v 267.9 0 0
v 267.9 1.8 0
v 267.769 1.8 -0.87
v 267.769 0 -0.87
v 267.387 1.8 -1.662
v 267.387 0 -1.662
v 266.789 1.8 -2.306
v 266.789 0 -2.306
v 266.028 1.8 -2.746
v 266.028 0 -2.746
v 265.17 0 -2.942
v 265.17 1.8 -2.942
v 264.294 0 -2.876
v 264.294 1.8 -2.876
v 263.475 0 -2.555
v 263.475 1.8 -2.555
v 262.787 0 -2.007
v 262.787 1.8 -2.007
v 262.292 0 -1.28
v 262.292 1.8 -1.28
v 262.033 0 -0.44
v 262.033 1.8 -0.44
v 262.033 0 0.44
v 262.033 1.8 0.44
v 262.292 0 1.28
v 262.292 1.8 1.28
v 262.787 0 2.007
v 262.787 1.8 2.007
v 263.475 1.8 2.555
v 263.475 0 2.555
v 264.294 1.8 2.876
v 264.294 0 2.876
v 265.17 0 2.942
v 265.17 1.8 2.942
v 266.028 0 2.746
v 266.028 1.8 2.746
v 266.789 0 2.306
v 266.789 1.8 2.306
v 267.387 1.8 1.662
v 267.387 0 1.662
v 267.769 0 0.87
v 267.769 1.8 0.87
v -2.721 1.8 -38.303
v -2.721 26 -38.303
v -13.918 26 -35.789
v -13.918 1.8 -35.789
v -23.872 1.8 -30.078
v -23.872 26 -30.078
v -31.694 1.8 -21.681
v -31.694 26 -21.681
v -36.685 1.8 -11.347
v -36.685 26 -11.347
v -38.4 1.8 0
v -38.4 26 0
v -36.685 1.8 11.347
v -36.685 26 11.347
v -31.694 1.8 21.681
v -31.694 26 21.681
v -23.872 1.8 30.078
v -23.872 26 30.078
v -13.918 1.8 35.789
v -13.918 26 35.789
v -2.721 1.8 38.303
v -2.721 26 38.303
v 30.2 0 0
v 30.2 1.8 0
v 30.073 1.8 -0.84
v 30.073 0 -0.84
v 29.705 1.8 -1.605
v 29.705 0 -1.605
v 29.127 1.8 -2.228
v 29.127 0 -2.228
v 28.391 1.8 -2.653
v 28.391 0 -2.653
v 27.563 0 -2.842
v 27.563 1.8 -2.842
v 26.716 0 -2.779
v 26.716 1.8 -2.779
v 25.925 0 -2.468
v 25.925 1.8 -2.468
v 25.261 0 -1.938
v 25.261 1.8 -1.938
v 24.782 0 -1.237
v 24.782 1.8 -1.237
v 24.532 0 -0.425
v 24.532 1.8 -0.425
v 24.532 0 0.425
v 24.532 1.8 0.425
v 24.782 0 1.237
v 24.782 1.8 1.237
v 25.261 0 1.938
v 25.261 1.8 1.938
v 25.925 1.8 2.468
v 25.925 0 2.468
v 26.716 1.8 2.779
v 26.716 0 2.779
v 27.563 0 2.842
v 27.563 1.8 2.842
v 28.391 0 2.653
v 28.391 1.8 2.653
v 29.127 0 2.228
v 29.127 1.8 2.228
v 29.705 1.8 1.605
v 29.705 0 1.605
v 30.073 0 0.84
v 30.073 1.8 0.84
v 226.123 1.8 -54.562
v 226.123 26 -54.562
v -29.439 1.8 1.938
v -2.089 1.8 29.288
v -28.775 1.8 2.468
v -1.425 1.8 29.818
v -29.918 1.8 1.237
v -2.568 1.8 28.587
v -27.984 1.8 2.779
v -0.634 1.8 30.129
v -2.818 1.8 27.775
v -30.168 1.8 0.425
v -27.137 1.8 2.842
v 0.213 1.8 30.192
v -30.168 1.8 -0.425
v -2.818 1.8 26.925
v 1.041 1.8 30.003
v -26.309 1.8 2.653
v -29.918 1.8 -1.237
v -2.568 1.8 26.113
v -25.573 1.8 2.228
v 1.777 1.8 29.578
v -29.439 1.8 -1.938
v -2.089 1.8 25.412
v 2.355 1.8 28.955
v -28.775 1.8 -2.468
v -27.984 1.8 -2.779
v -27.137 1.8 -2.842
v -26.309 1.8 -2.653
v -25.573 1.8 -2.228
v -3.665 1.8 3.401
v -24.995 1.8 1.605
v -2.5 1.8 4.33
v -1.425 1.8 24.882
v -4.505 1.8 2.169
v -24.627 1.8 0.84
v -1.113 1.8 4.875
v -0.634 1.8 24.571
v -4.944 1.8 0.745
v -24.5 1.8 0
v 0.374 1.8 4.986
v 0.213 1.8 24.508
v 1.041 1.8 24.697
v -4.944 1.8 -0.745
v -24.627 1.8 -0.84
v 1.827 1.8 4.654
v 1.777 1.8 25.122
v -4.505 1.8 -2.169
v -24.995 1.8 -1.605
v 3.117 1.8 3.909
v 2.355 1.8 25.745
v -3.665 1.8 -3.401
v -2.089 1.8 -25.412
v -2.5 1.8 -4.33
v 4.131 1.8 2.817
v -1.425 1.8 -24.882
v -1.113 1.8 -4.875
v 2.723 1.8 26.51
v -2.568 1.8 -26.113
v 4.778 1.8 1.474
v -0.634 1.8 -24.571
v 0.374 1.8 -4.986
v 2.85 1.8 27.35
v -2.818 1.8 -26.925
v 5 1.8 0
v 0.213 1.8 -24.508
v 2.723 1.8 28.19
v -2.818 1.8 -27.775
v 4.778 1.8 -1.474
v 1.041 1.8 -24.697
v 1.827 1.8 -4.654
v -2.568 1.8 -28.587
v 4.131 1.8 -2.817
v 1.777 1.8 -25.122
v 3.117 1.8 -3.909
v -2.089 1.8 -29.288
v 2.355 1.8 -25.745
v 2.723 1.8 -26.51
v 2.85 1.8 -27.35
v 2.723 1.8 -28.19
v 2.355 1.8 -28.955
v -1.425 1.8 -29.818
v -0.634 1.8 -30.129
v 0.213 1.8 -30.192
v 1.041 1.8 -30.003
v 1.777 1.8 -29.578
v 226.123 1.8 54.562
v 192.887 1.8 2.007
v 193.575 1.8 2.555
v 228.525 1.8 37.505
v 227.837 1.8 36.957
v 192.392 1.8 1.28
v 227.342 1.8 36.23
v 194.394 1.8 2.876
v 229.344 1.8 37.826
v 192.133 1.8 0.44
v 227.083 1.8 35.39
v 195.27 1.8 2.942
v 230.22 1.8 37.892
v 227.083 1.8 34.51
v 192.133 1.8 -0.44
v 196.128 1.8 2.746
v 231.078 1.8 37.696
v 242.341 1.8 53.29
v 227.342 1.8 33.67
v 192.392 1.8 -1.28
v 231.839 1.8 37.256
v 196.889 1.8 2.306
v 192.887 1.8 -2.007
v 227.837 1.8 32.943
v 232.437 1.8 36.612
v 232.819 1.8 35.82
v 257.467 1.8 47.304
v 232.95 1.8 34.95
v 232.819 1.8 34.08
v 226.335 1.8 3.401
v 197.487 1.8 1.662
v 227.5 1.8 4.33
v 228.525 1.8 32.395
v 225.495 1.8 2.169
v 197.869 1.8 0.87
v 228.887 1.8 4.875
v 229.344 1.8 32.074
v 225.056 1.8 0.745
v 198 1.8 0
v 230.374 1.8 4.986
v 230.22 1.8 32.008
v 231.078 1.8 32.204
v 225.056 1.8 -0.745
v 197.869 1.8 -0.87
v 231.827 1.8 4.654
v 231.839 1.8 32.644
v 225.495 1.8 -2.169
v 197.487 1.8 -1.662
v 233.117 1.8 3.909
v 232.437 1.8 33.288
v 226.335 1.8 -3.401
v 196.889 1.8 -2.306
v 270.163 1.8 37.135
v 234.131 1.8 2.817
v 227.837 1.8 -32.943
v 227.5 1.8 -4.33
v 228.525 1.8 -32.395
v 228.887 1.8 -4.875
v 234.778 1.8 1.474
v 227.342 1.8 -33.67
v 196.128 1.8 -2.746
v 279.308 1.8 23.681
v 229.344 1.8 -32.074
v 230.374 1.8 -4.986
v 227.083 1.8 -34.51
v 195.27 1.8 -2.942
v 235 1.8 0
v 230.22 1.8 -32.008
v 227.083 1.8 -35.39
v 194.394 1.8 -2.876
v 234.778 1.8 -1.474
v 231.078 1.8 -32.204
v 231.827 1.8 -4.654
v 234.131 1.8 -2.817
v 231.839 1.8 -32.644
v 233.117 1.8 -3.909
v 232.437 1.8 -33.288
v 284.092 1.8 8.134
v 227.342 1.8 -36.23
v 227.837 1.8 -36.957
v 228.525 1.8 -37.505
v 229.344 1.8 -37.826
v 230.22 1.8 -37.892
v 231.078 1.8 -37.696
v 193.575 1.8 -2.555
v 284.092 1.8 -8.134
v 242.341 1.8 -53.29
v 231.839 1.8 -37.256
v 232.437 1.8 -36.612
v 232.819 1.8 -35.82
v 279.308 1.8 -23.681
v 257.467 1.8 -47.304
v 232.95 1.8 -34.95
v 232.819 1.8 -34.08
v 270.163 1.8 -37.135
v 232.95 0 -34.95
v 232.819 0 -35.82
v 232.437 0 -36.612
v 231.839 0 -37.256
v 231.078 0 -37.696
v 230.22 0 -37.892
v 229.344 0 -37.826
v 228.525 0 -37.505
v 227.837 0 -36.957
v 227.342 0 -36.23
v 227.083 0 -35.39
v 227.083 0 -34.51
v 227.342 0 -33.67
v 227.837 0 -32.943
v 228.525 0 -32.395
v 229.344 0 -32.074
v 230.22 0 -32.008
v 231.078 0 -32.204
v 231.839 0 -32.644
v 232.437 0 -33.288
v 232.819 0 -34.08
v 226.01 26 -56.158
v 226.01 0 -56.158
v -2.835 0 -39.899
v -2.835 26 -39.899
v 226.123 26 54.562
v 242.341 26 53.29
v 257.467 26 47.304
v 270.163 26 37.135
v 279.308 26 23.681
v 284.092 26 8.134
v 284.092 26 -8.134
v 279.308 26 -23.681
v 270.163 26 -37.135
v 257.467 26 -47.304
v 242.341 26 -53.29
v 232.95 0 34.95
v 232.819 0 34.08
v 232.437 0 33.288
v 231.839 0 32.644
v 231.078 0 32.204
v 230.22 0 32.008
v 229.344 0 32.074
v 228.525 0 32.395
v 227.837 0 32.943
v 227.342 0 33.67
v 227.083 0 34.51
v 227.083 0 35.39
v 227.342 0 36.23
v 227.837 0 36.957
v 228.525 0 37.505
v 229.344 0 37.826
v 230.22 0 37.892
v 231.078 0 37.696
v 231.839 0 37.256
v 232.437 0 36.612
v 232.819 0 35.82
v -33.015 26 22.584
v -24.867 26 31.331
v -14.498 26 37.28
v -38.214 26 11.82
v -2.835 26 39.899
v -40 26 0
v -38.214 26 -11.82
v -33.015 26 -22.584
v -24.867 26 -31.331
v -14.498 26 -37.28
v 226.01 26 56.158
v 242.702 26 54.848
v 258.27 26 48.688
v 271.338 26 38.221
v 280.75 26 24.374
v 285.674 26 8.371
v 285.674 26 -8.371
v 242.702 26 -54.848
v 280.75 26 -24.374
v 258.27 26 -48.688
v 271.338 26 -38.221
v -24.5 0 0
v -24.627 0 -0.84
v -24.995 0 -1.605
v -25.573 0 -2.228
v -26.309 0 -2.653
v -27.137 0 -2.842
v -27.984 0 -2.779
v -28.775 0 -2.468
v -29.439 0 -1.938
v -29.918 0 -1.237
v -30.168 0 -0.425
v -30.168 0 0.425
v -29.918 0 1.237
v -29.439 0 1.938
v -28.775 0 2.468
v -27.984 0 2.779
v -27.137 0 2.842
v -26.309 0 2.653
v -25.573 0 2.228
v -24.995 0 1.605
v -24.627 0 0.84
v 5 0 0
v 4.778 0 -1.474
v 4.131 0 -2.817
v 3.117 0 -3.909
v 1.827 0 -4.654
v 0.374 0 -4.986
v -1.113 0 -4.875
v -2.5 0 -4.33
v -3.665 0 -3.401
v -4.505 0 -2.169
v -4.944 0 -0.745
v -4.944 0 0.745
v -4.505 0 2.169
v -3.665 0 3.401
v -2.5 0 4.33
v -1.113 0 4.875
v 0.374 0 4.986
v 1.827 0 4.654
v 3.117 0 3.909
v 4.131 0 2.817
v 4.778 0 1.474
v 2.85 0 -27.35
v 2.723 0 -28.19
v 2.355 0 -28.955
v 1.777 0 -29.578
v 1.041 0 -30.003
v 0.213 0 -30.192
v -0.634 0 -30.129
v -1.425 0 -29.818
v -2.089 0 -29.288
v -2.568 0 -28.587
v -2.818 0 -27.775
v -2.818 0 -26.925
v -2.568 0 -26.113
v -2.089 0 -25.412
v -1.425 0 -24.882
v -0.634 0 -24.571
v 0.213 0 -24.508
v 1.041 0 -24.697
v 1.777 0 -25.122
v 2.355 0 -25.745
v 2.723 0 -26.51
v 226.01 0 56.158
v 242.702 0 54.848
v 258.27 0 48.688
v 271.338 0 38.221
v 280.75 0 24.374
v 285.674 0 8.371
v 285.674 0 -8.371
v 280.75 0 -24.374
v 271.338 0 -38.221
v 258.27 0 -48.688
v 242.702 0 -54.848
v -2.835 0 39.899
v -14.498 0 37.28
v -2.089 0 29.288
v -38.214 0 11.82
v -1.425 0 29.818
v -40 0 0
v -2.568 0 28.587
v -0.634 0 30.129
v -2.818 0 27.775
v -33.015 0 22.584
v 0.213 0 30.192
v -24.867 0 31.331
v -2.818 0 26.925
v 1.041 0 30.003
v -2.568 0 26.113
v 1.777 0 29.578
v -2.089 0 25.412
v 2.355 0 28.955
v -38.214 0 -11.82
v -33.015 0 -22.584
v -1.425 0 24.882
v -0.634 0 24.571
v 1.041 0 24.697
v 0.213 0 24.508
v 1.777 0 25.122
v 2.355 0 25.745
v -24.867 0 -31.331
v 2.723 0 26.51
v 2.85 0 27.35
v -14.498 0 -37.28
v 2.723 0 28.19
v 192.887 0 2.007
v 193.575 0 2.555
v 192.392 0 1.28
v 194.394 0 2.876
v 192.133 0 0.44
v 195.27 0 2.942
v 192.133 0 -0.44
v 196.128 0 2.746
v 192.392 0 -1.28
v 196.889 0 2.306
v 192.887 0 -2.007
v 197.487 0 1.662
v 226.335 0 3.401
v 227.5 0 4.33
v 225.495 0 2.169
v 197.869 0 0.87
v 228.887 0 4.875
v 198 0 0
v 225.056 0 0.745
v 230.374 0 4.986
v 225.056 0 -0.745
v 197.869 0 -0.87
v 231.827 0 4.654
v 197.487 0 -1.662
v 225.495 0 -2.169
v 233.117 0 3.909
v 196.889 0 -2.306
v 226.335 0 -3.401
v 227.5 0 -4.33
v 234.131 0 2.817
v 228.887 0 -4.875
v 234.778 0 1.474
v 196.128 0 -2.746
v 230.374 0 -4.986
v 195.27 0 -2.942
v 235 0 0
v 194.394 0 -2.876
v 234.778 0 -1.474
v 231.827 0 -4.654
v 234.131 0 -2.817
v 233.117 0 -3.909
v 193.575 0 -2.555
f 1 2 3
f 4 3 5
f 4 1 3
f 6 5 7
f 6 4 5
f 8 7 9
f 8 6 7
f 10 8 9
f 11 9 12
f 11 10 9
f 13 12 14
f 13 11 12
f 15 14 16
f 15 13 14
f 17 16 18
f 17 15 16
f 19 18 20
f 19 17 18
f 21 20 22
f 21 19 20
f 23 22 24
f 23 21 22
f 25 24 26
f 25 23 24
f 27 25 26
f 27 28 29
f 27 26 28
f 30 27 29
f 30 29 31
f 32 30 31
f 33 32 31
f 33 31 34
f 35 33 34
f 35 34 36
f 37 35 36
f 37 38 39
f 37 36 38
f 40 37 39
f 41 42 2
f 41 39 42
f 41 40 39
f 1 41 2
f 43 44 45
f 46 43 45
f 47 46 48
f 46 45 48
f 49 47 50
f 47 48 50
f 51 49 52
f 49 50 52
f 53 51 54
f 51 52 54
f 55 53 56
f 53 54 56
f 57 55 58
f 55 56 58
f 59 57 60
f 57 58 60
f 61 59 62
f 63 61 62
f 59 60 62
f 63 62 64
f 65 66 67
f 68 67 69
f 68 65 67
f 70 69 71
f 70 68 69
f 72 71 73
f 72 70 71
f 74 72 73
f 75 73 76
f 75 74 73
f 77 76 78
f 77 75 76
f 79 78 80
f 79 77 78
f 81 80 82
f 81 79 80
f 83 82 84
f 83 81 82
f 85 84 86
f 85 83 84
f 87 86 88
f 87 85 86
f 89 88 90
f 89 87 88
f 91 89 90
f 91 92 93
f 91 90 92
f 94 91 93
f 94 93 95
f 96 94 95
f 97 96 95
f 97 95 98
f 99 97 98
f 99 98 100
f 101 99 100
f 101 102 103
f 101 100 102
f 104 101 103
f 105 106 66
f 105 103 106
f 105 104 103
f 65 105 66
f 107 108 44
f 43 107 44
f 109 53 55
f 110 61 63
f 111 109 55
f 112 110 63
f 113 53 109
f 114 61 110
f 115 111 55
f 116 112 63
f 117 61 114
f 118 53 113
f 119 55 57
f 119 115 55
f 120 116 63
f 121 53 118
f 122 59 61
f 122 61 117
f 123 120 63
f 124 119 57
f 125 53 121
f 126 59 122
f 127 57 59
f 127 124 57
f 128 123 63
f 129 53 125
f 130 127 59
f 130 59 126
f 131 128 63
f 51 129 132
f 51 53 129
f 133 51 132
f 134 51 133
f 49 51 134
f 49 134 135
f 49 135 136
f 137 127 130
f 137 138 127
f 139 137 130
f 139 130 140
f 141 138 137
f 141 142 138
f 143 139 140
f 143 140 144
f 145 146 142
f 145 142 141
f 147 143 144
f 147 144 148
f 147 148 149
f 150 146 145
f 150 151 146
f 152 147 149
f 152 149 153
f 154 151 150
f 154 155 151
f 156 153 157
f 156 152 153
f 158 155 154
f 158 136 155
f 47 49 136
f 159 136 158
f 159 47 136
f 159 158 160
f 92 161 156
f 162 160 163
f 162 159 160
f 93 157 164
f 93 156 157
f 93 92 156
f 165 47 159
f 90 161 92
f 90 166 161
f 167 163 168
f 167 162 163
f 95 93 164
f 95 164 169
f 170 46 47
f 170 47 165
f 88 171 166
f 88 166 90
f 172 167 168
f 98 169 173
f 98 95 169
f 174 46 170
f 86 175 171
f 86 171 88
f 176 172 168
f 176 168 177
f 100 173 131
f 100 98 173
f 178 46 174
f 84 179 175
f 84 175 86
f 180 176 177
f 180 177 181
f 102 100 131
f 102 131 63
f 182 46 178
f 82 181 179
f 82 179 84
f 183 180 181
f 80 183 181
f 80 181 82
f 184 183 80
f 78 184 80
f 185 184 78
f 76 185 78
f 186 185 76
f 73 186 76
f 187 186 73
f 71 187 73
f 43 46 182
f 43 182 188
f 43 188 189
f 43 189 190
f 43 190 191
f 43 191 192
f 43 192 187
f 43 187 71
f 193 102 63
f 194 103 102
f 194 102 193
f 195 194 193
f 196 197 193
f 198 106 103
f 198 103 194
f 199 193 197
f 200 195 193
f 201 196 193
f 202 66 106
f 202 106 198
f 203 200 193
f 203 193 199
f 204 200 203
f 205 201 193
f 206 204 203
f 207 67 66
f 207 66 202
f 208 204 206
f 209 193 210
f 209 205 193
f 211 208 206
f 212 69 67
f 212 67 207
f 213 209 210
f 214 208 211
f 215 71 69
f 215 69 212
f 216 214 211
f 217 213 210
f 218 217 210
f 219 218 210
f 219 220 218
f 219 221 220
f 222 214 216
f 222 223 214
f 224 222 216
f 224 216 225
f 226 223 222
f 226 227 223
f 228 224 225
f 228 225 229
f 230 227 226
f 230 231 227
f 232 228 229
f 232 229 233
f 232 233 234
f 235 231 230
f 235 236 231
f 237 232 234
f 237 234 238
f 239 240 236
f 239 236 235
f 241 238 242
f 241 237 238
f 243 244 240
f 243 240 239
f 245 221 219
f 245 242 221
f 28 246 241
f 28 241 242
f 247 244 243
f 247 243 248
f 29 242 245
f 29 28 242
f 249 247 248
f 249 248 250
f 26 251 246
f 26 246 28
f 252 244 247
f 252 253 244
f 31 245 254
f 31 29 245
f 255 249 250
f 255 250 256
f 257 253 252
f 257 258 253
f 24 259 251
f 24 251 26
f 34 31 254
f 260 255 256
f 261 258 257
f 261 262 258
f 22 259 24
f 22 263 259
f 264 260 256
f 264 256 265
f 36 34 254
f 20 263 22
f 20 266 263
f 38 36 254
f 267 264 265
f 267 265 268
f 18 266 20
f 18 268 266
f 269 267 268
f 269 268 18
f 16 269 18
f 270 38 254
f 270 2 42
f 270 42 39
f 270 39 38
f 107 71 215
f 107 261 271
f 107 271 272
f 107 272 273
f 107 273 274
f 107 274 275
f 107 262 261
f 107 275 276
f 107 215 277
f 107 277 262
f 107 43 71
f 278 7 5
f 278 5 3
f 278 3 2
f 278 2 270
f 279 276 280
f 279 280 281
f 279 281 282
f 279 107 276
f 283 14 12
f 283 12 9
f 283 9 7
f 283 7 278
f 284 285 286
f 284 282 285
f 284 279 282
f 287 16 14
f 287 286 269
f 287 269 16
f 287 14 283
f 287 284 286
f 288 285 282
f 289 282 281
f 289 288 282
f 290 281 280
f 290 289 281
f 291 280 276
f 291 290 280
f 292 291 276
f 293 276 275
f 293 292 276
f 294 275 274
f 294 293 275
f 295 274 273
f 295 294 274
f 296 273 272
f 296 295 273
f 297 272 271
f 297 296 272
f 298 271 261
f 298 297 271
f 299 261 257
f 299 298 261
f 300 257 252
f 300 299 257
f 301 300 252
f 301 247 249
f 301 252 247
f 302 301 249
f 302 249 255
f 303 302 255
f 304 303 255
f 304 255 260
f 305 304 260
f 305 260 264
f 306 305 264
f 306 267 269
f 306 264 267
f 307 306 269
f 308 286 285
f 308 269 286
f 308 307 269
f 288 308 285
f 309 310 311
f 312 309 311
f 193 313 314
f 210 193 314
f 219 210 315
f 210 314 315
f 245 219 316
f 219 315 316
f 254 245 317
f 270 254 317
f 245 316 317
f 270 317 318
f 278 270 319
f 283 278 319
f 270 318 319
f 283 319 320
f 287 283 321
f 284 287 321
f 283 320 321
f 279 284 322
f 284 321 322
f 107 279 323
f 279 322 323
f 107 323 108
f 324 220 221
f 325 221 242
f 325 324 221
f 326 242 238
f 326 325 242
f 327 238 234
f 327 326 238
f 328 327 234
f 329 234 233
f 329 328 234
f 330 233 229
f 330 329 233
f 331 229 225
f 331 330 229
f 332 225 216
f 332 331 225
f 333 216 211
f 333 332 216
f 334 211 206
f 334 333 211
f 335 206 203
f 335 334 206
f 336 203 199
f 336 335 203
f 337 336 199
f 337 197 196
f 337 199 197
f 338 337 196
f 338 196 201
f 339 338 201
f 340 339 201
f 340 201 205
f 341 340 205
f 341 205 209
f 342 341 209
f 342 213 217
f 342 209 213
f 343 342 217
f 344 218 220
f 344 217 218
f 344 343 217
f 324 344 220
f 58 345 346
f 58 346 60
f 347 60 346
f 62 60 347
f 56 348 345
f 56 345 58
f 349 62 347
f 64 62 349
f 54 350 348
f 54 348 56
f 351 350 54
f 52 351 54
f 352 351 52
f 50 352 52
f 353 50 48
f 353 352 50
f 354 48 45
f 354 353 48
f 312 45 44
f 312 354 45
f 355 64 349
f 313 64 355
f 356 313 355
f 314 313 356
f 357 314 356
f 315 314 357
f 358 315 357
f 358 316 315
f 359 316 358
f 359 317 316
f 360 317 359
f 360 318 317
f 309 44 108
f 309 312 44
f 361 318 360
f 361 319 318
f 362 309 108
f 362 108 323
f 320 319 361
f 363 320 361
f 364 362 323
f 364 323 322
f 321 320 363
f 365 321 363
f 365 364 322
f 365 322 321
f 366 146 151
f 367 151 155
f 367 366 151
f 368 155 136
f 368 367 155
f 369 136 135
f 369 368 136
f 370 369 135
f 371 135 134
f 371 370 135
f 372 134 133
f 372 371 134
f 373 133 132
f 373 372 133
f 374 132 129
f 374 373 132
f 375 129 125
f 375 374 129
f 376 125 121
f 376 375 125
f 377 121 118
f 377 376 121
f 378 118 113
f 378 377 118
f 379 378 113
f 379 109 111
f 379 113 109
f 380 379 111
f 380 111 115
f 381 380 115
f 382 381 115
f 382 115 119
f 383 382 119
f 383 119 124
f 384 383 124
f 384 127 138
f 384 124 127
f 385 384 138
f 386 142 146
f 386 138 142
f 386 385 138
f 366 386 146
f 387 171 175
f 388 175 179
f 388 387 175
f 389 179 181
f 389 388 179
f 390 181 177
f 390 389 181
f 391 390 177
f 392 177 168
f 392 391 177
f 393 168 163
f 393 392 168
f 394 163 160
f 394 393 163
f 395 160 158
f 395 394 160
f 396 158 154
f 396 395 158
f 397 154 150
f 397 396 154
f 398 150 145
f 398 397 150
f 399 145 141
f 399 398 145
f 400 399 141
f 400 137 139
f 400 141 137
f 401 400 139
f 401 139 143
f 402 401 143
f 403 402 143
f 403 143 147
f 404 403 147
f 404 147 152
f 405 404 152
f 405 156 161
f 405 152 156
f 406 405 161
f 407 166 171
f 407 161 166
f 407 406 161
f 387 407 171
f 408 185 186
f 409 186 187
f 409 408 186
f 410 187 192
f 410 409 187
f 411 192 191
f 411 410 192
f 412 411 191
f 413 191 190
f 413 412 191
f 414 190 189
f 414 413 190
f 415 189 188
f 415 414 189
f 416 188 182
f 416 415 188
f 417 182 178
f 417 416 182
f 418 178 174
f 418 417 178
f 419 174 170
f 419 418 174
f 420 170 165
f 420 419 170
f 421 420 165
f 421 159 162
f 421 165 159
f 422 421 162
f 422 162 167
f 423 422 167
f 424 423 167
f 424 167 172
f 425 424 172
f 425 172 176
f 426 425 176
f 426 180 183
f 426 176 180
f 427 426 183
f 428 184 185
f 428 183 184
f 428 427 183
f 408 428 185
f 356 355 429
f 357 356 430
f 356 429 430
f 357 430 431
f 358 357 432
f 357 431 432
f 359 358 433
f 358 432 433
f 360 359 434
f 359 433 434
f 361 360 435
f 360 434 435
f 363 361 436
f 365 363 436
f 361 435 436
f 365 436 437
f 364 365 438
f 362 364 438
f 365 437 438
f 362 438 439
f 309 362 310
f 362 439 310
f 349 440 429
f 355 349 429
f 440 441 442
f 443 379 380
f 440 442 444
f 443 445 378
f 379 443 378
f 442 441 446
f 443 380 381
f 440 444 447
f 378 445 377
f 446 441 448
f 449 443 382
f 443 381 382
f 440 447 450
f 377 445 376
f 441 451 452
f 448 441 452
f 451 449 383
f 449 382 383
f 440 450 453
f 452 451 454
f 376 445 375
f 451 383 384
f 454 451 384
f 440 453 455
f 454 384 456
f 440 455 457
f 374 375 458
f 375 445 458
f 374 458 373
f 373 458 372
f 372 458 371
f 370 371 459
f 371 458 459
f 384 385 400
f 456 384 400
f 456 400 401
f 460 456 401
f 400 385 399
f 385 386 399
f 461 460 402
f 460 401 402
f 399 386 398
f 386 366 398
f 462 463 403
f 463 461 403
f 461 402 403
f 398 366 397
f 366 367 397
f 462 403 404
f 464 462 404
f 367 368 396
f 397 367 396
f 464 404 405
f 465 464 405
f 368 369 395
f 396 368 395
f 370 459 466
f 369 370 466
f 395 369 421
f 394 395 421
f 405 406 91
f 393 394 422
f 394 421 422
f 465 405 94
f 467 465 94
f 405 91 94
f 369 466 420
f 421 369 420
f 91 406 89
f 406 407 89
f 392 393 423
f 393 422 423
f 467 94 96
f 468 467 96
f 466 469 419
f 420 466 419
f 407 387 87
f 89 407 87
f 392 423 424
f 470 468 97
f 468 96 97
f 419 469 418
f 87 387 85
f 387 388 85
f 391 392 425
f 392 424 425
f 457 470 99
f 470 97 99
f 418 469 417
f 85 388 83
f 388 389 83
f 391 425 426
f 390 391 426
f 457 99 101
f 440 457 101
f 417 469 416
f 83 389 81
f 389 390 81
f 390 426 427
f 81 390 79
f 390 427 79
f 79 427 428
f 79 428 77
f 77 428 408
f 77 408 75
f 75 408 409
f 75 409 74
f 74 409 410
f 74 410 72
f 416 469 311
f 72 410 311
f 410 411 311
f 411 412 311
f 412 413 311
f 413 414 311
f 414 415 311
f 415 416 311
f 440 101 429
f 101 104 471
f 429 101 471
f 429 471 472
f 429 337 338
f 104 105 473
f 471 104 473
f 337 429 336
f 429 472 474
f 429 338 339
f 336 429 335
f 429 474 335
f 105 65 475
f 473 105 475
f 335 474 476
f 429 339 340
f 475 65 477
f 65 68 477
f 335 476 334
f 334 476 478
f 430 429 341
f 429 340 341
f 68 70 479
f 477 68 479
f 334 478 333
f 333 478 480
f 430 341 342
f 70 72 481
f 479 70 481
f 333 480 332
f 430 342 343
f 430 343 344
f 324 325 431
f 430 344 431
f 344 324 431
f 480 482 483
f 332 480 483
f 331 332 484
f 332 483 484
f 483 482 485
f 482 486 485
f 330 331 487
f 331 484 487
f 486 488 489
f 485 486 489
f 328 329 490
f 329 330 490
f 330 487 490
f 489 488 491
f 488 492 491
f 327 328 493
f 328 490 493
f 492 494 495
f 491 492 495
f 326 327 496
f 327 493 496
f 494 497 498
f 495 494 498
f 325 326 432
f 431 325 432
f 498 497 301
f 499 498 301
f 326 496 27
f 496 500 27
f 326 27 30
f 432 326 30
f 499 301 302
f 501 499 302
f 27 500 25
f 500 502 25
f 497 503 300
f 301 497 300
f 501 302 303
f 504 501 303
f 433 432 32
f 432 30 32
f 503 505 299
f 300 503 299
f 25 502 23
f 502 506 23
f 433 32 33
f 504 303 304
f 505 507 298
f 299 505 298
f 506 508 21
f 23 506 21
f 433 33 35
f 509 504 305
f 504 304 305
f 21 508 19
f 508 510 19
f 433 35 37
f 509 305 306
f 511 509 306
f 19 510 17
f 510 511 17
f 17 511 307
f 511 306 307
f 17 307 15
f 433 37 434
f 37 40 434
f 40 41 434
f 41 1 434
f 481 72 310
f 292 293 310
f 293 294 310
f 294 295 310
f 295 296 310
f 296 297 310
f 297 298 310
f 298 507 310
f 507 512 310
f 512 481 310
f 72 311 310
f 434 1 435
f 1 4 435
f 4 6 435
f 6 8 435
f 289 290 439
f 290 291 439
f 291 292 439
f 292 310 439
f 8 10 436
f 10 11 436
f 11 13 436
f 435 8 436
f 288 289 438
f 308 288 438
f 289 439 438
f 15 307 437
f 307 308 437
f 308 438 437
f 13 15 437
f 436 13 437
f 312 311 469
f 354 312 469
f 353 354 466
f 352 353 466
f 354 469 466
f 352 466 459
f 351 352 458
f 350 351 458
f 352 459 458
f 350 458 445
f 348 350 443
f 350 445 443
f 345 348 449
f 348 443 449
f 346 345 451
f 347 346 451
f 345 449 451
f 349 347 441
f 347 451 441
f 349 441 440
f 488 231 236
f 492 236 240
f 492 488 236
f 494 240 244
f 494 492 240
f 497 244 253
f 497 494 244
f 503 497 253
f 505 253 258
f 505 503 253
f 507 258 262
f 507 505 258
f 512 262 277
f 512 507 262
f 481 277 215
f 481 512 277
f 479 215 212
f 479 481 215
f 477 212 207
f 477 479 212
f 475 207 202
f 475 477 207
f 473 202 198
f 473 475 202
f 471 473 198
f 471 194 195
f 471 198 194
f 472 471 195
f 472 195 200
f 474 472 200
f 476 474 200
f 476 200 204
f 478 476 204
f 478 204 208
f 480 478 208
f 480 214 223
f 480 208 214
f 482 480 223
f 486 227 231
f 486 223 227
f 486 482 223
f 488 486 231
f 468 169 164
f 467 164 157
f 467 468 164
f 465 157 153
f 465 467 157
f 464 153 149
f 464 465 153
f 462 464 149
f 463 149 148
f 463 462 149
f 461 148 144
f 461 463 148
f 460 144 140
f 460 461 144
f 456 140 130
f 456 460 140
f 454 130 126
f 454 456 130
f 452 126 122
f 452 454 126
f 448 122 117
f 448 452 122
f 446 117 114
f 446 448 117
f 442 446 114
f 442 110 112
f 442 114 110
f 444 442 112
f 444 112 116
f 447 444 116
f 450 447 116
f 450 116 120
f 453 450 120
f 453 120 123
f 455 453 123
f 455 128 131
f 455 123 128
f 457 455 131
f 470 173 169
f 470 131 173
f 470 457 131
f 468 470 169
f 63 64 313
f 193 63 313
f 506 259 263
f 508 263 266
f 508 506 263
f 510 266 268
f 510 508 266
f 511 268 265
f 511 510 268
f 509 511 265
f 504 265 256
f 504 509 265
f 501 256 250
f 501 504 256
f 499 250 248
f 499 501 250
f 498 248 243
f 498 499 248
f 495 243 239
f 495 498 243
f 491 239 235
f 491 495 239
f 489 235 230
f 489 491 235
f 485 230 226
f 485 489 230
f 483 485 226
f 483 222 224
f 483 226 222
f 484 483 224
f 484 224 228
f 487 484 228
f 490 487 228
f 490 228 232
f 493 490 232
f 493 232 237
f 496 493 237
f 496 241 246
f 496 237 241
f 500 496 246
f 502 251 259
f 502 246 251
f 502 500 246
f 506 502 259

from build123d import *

# Parameters (mm, degrees)
SKETCH1_R           = 40
SKETCH1_R_2         = 2.85
SKETCH1_R_3         = 5
SKETCH1_R_4         = 56.3
SKETCH1_R_5         = 2.95
BOSS_EXTRUDE1_DEPTH = 26
CUT_EXTRUDE1_DEPTH  = 24.2


with BuildPart() as part:
    # Sketch1 → Boss-Extrude1 (new body)
    with BuildSketch(Plane(origin=(0, 0, 0), x_dir=(1, 0, 0), z_dir=(0, 1, 0))):
        with BuildLine():
            Line((226.010043478, 56.158438787), (-2.834782609, 39.899423649))
            ThreePointArc((-2.834782609, 39.899423649), (27.263608489, 29.269363713), (40, 0))
            ThreePointArc((40, 0), (27.263608489, -29.269363713), (-2.834782609, -39.899423649))
            Line((-2.834782609, -39.899423649), (226.010043478, -56.158438787))
            ThreePointArc((226.010043478, -56.158438787), (173.7, 0), (226.010043478, 56.158438787))
        make_face()
        Circle(SKETCH1_R)
        with Locations((-27.35, 0)):
            Circle(SKETCH1_R_2, mode=Mode.SUBTRACT)
        with Locations((0, -27.35)):
            Circle(SKETCH1_R_2, mode=Mode.SUBTRACT)
        with Locations((27.35, 0)):
            Circle(SKETCH1_R_2, mode=Mode.SUBTRACT)
        with Locations((0, 27.35)):
            Circle(SKETCH1_R_2, mode=Mode.SUBTRACT)
        Circle(SKETCH1_R_3, mode=Mode.SUBTRACT)
        with Locations((230, 0)):
            Circle(SKETCH1_R_4)
        with Locations((195.05, 0)):
            Circle(SKETCH1_R_5, mode=Mode.SUBTRACT)
        with Locations((230, -34.95)):
            Circle(SKETCH1_R_5, mode=Mode.SUBTRACT)
        with Locations((264.95, 0)):
            Circle(SKETCH1_R_5, mode=Mode.SUBTRACT)
        with Locations((230, 34.95)):
            Circle(SKETCH1_R_5, mode=Mode.SUBTRACT)
        with Locations((230, 0)):
            Circle(SKETCH1_R_3, mode=Mode.SUBTRACT)
    extrude(amount=BOSS_EXTRUDE1_DEPTH)

    # Sketch2 → Cut-Extrude1 (cut)
    with BuildSketch(Plane(origin=(0, 26, 0), x_dir=(1, 0, 0), z_dir=(0, 1, 0))):
        with BuildLine():
            Line((-2.721391304, -38.303446704), (226.123434783, -54.562461841))
            ThreePointArc((226.123434783, -54.562461841), (284.7, 0), (226.123434783, 54.562461841))
            Line((226.123434783, 54.562461841), (-2.721391304, 38.303446704))
            ThreePointArc((-2.721391304, 38.303446704), (-38.4, 0), (-2.721391304, -38.303446704))
        make_face()
    extrude(amount=-CUT_EXTRUDE1_DEPTH, mode=Mode.SUBTRACT)


solid = part.part
